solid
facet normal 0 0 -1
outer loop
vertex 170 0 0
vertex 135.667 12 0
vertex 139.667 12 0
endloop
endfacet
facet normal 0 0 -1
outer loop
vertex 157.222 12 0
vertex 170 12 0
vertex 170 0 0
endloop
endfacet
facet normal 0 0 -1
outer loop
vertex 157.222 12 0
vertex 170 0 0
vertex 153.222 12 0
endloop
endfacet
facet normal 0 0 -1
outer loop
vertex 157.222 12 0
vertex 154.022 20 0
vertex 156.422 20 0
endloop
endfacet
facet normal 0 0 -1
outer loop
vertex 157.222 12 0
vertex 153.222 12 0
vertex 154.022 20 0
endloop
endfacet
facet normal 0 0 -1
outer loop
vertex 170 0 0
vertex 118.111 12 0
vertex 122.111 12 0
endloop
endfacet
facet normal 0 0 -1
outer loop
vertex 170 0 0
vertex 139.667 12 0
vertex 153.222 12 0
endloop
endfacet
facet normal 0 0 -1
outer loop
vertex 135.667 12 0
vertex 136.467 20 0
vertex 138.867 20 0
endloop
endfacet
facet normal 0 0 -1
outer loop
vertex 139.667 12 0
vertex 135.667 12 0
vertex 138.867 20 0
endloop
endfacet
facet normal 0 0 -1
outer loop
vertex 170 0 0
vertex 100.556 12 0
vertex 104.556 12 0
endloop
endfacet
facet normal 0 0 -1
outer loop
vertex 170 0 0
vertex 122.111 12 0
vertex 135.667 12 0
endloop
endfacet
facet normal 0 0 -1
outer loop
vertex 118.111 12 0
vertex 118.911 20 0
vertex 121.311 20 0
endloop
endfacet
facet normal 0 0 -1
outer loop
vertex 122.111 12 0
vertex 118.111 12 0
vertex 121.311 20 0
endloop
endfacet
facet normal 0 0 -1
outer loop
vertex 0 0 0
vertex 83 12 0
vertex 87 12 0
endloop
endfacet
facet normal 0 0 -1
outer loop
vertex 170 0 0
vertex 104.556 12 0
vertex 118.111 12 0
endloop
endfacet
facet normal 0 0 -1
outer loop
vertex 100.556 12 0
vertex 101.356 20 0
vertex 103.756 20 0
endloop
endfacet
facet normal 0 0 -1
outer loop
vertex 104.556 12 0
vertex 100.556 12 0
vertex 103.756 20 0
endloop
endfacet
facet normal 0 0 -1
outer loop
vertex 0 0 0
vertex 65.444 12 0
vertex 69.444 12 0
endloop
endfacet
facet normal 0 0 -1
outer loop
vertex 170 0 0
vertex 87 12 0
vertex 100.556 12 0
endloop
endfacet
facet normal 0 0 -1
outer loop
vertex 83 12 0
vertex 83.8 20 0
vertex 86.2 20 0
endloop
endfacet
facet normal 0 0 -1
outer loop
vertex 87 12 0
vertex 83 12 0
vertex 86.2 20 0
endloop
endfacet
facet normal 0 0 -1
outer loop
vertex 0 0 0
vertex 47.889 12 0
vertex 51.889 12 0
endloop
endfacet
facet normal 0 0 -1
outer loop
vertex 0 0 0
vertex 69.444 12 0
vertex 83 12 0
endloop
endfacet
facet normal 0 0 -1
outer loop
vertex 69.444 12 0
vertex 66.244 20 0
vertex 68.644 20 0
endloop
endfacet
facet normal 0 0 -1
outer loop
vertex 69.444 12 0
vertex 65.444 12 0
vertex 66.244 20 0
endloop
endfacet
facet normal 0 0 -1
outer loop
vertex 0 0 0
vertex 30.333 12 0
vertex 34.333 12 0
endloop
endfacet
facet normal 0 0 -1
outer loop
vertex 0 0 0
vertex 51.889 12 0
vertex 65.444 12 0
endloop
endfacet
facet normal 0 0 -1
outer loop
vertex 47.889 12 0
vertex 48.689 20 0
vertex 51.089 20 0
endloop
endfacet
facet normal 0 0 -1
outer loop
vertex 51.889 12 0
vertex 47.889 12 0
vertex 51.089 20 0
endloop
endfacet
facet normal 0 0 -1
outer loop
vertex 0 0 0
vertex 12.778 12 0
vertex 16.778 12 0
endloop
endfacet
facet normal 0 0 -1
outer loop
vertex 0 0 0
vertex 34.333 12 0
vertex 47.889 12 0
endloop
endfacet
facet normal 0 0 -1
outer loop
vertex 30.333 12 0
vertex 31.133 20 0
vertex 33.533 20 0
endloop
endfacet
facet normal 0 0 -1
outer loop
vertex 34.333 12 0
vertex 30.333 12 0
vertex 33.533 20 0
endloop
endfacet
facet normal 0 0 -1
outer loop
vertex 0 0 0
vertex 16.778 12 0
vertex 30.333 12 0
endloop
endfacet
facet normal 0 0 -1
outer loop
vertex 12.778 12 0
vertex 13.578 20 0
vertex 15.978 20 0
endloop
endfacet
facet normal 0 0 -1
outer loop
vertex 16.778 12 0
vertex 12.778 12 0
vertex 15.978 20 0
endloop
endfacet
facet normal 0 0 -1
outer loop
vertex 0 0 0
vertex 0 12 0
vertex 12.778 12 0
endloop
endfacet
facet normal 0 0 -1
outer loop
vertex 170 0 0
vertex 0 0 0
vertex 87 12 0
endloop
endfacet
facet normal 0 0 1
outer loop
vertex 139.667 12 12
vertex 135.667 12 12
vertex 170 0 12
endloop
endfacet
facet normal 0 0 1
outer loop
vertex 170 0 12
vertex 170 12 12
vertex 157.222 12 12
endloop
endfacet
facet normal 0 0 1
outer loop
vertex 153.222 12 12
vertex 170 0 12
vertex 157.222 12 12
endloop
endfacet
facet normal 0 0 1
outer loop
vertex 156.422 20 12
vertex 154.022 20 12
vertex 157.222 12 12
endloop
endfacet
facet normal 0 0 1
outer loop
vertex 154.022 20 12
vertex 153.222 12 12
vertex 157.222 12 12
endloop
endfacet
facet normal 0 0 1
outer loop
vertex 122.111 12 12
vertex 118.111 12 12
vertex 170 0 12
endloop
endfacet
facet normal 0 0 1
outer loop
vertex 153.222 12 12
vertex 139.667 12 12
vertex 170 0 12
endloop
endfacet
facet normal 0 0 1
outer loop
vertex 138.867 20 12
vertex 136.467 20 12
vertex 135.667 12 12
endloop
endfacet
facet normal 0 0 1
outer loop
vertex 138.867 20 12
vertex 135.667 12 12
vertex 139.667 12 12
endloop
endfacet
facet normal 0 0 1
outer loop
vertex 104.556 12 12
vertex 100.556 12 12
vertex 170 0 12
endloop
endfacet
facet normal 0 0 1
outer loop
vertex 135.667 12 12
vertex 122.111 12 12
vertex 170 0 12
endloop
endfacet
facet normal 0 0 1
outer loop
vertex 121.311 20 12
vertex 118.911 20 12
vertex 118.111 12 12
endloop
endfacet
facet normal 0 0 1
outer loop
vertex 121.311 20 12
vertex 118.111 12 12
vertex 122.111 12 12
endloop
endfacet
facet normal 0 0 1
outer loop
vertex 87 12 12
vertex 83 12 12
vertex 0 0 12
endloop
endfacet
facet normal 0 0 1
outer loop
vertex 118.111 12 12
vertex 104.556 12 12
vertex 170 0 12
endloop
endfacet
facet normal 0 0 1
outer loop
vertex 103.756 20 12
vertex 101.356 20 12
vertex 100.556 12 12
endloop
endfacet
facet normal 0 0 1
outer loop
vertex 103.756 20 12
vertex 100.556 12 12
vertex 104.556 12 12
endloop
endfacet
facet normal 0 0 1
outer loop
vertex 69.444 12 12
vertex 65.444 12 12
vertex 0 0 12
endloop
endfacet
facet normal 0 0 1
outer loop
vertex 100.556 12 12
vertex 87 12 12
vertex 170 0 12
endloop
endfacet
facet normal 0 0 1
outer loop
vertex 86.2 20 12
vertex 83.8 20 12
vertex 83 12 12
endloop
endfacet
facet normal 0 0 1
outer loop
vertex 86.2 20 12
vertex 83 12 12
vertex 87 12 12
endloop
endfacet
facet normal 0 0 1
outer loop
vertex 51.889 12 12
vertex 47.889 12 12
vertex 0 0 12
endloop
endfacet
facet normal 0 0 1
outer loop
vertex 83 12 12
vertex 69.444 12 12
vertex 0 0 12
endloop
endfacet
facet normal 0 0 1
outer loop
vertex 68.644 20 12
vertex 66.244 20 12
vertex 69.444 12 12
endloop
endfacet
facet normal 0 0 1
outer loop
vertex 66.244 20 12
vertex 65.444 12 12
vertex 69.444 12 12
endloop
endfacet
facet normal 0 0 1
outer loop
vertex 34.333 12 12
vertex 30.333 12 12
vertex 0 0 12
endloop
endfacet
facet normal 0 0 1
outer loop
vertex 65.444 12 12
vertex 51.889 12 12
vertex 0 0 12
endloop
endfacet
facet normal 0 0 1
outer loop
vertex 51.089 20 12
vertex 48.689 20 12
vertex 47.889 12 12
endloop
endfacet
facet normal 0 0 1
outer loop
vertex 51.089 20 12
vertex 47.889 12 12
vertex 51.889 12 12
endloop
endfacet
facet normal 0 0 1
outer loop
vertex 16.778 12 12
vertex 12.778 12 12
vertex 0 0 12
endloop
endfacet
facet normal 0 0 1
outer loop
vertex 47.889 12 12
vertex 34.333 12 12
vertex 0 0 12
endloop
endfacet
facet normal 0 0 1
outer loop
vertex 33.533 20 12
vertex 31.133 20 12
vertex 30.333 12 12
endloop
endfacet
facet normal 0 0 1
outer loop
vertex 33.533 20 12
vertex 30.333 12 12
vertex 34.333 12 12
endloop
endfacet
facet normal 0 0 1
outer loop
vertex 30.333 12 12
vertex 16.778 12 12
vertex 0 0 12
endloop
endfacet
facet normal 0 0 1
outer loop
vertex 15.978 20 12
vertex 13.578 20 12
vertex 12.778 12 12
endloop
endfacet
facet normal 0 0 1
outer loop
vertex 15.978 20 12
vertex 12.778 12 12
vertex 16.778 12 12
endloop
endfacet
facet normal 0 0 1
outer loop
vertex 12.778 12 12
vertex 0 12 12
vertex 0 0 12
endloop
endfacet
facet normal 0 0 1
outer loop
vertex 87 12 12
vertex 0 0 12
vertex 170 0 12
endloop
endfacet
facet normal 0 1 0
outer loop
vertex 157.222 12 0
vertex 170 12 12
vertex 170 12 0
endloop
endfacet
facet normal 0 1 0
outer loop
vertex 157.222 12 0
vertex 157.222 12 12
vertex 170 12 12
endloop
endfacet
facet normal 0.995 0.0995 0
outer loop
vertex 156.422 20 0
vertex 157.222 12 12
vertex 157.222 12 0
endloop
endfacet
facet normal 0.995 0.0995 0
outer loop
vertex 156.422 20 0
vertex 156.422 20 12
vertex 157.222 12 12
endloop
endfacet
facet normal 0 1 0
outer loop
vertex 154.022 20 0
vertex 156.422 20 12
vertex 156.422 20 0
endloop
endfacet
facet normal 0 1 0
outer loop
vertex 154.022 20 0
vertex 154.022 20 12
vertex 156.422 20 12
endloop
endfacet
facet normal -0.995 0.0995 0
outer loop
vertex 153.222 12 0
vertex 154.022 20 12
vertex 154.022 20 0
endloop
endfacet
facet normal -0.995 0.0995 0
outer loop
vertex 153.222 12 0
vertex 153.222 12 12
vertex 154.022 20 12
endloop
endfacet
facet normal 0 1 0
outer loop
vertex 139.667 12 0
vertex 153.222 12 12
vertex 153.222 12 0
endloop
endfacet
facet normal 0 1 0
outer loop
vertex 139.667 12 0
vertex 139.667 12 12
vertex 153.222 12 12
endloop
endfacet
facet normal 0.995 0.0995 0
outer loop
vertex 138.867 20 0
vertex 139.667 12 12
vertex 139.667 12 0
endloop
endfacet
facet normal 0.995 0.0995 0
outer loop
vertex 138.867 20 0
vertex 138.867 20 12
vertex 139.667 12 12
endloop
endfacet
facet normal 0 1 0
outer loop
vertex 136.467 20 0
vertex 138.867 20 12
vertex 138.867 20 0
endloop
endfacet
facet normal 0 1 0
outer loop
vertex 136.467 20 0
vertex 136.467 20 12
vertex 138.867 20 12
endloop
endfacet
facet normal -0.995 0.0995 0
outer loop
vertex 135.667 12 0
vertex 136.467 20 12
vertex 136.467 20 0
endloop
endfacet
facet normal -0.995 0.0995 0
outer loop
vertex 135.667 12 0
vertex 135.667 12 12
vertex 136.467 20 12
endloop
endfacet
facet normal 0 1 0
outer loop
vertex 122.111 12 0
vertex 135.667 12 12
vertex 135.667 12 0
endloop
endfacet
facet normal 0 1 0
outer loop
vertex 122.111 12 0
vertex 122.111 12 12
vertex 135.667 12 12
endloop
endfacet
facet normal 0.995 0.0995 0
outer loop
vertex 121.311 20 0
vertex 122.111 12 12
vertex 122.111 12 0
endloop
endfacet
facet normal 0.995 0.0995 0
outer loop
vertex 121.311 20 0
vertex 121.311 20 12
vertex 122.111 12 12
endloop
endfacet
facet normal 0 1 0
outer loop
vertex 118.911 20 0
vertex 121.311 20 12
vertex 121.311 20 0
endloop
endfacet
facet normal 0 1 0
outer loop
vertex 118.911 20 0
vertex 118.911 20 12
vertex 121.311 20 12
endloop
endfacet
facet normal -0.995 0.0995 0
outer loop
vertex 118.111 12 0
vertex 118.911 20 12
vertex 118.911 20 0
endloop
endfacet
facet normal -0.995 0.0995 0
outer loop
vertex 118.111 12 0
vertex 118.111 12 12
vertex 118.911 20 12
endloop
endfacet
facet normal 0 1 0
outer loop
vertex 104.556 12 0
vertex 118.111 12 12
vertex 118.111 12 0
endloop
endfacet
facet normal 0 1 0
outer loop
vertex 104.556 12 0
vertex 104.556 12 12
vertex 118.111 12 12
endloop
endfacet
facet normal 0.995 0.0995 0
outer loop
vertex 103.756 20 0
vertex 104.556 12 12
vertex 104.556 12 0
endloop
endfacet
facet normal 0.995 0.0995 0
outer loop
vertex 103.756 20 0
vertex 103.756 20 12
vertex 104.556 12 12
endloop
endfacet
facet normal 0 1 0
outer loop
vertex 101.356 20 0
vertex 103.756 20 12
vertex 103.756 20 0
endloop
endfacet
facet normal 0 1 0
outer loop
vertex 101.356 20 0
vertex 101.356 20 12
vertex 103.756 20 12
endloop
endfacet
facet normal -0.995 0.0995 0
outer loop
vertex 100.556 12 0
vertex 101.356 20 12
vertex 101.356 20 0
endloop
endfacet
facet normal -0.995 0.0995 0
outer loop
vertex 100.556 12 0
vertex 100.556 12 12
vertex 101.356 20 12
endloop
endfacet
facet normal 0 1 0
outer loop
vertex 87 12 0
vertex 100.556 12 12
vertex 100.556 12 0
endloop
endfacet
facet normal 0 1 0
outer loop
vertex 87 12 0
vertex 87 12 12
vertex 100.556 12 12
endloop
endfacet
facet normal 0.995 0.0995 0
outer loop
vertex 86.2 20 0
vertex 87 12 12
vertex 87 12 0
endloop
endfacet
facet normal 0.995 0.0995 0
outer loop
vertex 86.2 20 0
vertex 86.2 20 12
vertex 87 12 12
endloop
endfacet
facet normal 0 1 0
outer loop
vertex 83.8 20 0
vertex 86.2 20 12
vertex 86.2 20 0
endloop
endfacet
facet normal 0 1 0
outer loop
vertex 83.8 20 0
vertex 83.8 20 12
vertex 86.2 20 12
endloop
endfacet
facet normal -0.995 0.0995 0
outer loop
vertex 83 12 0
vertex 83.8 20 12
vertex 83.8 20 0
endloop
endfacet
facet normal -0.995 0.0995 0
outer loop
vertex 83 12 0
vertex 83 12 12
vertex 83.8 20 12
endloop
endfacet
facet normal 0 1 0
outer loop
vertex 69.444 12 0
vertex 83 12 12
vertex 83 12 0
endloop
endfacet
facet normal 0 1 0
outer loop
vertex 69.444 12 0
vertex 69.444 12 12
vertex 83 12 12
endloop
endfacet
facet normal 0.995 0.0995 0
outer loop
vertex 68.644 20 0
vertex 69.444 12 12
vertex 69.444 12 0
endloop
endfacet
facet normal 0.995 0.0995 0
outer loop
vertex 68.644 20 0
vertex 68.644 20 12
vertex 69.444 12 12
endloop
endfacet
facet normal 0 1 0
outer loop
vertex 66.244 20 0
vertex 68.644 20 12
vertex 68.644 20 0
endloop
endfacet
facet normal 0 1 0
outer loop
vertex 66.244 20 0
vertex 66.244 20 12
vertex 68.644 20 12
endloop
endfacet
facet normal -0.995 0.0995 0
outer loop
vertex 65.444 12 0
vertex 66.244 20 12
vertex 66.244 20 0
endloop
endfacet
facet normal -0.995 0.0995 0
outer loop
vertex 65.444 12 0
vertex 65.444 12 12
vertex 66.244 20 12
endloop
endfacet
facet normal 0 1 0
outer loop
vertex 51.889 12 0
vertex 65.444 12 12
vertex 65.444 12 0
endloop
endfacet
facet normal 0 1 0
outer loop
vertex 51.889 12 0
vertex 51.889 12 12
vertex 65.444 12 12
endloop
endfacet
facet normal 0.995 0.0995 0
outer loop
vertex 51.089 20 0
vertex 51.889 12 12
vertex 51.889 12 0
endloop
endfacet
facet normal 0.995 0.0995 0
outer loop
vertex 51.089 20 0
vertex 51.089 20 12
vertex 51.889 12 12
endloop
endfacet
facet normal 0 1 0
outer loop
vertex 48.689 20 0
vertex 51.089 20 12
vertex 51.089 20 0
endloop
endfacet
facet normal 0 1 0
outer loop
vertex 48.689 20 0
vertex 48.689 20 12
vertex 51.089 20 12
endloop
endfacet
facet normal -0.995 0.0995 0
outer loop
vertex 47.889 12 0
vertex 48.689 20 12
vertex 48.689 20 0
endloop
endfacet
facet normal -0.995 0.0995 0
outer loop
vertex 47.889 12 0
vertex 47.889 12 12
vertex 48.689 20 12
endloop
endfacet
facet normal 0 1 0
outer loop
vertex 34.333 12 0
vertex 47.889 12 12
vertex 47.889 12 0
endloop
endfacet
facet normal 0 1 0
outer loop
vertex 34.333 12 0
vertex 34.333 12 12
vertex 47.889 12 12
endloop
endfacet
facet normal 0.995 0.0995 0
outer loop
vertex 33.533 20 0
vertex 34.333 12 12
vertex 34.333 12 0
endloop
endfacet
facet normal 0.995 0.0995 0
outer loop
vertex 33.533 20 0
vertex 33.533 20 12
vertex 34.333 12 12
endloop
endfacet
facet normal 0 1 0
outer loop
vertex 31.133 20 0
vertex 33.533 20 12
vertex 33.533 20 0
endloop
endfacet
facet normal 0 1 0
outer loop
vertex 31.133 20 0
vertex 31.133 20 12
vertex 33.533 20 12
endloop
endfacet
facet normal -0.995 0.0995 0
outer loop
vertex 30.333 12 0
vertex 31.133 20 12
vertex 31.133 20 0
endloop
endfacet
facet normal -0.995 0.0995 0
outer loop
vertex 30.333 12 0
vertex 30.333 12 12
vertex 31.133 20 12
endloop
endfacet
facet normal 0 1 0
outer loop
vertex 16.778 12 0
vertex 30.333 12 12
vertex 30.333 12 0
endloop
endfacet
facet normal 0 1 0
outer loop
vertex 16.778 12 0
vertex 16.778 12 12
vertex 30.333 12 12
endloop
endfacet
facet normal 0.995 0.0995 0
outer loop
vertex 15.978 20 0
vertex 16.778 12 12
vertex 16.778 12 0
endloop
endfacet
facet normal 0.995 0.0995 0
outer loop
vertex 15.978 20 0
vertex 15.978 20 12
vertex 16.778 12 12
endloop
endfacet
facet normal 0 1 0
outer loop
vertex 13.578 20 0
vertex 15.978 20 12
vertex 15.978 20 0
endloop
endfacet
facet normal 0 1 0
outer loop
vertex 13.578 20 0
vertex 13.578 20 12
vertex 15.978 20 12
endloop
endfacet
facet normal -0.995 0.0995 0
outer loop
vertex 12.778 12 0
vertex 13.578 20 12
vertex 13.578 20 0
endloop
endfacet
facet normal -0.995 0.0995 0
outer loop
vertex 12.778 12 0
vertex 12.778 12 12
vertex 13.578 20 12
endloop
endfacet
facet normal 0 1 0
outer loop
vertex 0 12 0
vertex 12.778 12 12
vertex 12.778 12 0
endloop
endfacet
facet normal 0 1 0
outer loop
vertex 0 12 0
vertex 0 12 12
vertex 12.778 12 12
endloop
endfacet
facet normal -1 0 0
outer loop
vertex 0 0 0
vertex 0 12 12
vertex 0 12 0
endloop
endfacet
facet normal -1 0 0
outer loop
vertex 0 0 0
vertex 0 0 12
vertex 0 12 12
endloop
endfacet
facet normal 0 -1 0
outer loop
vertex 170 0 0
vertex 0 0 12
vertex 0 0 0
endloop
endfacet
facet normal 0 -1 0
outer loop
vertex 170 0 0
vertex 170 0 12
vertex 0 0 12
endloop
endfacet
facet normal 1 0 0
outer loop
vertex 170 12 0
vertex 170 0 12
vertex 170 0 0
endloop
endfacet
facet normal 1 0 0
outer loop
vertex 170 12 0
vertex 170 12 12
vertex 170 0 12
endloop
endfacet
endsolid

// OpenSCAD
$fn = 32;

// ----------------------------------------------------------------------
// Gear rack: 9 teeth on a 170 mm bar, pitch 17.56 mm
// ----------------------------------------------------------------------

// --- parameters (mm) ---
profile_height = 12;      // extrusion height
profile_points = 40;      // points of the closed outline

profile = [[0, 0], [170, 0], [170, 12], [157.222, 12], [156.422, 20], [154.022, 20], [153.222, 12], [139.667, 12], [138.867, 20], [136.467, 20], [135.667, 12], [122.111, 12], [121.311, 20], [118.911, 20], [118.111, 12], [104.556, 12], [103.756, 20], [101.356, 20], [100.556, 12], [87, 12], [86.2, 20], [83.8, 20], [83, 12], [69.444, 12], [68.644, 20], [66.244, 20], [65.444, 12], [51.889, 12], [51.089, 20], [48.689, 20], [47.889, 12], [34.333, 12], [33.533, 20], [31.133, 20], [30.333, 12], [16.778, 12], [15.978, 20], [13.578, 20], [12.778, 12], [0, 12]];  // single closed polygon, 40 points, counter clockwise

// --- the one profile operation ---
linear_extrude(height = profile_height) polygon(points = profile);
